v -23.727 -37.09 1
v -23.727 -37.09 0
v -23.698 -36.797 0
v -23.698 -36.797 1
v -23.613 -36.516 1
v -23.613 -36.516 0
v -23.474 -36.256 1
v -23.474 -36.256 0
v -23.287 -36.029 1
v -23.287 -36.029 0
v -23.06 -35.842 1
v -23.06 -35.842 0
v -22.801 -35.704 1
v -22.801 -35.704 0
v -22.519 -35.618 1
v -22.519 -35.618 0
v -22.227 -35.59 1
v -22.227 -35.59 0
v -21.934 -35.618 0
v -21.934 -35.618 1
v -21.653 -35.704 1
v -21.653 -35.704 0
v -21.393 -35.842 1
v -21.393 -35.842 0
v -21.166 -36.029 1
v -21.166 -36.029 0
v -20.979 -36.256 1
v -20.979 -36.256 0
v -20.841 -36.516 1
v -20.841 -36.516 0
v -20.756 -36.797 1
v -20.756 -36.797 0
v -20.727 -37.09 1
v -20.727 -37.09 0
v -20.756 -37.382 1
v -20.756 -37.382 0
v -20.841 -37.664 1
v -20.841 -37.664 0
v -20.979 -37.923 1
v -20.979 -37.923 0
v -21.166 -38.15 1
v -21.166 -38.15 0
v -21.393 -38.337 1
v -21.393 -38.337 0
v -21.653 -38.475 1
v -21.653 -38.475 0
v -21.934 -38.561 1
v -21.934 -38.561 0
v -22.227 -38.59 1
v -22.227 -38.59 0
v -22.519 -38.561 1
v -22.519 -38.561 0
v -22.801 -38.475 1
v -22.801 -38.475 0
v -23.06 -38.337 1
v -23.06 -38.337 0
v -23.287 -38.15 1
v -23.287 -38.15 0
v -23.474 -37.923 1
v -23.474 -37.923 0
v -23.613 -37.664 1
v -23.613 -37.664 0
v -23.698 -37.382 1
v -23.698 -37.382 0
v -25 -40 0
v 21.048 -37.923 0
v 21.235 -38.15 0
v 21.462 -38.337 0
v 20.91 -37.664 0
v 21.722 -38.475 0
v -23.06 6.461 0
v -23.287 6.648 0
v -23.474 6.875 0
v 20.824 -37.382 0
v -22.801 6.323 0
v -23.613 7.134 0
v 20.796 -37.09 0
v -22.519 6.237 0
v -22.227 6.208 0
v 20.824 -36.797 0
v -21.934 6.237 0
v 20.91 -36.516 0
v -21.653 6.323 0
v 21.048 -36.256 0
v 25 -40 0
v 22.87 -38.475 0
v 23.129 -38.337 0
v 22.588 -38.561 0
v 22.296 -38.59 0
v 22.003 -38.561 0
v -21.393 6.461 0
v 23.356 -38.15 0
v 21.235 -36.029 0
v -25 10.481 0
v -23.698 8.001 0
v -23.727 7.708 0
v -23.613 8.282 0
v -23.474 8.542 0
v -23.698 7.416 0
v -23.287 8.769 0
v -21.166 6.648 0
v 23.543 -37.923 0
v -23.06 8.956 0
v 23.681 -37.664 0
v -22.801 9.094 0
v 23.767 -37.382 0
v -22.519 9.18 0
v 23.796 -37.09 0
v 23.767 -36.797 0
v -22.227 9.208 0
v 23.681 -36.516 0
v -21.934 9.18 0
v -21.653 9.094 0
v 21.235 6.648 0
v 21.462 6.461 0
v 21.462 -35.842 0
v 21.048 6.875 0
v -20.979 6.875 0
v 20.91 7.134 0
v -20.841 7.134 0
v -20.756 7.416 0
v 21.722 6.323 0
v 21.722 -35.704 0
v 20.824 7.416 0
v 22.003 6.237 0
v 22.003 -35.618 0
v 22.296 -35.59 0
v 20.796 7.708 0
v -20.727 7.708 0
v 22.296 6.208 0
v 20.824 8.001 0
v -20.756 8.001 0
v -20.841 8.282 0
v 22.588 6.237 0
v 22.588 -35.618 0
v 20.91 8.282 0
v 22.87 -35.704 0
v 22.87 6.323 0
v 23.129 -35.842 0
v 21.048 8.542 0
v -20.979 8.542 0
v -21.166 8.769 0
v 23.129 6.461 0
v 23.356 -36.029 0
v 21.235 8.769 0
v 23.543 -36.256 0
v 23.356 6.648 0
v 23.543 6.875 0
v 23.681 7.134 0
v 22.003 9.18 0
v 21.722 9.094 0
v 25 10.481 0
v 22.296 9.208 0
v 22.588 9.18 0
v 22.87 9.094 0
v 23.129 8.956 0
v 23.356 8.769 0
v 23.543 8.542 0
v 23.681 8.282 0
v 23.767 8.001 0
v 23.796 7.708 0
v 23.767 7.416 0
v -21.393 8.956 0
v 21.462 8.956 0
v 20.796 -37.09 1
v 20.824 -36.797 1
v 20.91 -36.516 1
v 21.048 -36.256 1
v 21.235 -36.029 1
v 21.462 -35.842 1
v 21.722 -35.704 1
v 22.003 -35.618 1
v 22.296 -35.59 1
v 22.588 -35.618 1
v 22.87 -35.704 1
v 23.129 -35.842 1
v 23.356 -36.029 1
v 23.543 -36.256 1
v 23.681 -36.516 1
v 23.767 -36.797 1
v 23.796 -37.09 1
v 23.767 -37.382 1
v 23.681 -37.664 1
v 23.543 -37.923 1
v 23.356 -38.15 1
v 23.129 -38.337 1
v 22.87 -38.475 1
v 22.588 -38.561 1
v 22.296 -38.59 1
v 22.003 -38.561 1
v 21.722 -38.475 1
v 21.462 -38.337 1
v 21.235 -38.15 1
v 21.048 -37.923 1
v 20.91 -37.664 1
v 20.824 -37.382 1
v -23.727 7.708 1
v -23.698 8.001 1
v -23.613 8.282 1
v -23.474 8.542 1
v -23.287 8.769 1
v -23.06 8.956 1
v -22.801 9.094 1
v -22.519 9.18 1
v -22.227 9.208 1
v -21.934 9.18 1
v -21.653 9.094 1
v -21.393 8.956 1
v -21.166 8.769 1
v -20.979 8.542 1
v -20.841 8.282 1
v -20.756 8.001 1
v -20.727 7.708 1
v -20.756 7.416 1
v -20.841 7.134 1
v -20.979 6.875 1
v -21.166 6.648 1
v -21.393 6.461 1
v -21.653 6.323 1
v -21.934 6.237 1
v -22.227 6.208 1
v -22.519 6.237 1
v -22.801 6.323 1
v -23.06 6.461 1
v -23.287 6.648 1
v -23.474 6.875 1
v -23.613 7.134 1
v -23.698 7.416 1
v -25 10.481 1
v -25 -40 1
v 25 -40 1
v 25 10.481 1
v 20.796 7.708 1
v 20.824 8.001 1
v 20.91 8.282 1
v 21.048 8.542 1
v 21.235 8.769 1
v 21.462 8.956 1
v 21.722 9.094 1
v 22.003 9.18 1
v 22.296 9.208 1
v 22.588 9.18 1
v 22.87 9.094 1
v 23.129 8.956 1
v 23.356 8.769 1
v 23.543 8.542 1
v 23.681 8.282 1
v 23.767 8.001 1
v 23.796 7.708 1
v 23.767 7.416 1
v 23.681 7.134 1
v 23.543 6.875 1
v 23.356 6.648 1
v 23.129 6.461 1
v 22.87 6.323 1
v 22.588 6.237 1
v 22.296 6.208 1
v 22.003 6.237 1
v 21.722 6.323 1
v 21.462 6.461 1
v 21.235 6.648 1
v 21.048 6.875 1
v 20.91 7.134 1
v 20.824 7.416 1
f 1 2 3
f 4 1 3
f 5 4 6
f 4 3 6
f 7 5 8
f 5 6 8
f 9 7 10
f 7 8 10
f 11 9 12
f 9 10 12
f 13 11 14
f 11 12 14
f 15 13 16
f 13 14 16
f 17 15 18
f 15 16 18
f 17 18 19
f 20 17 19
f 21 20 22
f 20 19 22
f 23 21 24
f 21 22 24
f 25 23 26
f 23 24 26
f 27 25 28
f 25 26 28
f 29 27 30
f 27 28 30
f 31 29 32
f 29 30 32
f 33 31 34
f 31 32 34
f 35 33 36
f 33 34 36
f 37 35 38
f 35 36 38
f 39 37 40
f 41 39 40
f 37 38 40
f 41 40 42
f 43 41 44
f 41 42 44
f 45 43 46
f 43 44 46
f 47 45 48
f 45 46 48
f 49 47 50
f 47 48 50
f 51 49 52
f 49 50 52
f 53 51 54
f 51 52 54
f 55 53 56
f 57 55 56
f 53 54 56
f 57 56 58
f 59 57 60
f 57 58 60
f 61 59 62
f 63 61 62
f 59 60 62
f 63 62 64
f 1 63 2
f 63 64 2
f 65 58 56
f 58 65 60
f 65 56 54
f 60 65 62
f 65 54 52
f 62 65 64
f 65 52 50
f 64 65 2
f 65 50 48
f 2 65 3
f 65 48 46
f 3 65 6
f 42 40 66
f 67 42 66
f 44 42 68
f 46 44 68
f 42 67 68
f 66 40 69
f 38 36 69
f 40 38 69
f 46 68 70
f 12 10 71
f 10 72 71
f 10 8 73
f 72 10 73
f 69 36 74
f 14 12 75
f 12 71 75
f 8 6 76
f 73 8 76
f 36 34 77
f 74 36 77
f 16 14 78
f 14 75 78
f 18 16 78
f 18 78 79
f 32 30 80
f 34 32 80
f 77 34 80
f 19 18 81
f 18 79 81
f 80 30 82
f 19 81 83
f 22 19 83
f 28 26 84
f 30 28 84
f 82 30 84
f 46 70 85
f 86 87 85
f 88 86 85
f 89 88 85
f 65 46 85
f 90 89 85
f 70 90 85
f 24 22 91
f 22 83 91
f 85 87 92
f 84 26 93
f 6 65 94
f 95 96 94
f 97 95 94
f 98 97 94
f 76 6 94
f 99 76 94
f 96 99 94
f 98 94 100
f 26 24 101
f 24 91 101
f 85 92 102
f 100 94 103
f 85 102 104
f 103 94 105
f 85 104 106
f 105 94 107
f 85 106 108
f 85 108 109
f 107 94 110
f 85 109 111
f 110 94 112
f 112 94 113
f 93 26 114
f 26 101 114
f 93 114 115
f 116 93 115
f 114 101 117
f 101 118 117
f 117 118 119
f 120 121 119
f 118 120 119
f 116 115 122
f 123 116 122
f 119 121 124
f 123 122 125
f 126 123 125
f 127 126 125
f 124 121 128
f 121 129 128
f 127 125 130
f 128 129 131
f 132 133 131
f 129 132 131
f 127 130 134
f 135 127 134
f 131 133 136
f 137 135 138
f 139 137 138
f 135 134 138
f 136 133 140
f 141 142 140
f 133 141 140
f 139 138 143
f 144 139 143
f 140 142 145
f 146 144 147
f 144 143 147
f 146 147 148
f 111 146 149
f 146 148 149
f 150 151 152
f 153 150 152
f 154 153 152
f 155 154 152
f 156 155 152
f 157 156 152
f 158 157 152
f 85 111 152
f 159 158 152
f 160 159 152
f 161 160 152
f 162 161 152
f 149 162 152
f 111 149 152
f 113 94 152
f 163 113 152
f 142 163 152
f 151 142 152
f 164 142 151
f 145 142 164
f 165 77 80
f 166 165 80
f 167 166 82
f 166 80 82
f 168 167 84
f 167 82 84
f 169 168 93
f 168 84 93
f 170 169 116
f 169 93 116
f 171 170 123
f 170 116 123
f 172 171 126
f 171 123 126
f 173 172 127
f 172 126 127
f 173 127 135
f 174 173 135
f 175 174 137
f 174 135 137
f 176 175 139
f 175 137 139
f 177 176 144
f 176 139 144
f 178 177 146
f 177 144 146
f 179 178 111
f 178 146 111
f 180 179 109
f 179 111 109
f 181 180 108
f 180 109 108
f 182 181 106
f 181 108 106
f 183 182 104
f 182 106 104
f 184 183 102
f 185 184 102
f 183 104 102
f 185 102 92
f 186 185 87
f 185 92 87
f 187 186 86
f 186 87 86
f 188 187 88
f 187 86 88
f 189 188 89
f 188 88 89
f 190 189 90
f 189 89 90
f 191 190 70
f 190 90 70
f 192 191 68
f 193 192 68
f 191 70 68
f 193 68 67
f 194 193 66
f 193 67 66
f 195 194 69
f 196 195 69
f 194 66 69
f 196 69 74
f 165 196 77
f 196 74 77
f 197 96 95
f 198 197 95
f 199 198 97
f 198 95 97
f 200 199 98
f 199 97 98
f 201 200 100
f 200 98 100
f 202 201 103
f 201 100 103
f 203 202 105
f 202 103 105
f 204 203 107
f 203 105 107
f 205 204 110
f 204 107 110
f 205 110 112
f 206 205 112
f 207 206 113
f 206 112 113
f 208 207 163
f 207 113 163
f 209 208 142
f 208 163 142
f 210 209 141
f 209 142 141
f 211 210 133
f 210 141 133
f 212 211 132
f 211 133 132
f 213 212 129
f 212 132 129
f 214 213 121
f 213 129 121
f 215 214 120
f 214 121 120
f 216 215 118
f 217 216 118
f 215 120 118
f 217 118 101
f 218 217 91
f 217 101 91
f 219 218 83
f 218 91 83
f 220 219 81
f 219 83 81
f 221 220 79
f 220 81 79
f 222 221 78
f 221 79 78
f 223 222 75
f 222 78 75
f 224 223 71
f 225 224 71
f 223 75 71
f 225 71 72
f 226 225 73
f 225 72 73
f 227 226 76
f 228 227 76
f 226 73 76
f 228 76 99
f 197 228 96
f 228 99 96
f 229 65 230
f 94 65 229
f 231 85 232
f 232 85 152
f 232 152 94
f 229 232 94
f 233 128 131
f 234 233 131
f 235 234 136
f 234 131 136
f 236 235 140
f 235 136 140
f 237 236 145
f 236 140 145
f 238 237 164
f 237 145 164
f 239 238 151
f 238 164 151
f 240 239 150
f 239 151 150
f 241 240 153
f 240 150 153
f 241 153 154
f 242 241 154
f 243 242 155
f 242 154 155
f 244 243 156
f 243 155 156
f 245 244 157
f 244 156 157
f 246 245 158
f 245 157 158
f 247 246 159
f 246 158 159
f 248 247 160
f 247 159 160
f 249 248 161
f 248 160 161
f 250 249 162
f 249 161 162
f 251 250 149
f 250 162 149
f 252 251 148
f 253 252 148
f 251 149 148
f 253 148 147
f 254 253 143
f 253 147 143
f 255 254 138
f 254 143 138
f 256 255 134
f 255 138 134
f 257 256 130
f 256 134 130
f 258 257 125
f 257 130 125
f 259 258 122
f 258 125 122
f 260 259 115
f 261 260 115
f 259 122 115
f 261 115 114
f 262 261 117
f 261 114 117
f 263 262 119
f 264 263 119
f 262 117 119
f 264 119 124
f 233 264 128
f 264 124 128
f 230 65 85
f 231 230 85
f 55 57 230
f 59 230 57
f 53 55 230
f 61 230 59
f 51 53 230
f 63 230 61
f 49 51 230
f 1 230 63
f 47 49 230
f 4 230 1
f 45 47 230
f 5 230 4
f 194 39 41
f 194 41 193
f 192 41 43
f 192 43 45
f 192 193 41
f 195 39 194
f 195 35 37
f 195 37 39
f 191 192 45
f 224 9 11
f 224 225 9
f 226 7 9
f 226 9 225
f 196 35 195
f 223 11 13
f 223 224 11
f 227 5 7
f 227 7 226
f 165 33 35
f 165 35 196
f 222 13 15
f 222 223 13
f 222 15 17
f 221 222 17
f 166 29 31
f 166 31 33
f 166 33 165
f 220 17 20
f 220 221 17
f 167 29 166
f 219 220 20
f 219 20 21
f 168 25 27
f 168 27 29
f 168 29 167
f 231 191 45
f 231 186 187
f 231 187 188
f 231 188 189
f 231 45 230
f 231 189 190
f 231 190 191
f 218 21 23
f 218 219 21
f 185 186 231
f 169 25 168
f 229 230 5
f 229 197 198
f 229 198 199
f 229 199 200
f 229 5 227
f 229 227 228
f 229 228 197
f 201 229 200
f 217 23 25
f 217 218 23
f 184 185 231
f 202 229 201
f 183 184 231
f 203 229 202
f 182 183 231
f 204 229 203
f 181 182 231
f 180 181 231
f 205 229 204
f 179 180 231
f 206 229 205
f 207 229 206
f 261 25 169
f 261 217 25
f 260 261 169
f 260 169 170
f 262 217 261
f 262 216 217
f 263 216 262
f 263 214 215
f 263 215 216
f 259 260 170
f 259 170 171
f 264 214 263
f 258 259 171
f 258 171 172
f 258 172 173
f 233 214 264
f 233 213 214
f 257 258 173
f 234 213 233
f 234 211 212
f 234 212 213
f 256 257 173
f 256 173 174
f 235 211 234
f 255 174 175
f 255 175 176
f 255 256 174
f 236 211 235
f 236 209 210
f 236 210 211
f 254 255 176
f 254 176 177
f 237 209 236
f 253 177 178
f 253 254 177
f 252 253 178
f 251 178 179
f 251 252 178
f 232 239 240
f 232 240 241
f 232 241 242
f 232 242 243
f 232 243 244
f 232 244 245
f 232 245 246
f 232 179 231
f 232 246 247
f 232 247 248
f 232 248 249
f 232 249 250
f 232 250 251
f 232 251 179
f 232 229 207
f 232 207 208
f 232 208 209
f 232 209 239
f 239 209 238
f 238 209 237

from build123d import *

# Parameters (mm, degrees)
SKETCH2_W           = 50
SKETCH2_H           = 80
BOSS_EXTRUDE1_DEPTH = 1
SKETCH3_W           = 50
SKETCH3_H           = 29.519153455
CUT_EXTRUDE1_DEPTH  = 1
SKETCH4_R           = 1.5
CUT_EXTRUDE2_DEPTH  = 1


with BuildPart() as part:
    # Sketch2 → Boss-Extrude1 (new body)
    with BuildSketch(Plane.XY):
        Rectangle(SKETCH2_W, SKETCH2_H)
    extrude(amount=BOSS_EXTRUDE1_DEPTH)

    # Sketch3 → Cut-Extrude1 (cut)
    with BuildSketch(Plane(origin=(0, 0, 0), x_dir=(-1, 0, 0), z_dir=(0, 0, -1))):
        with Locations((0, 25.240423272)):
            Rectangle(SKETCH3_W, SKETCH3_H)
    extrude(amount=-CUT_EXTRUDE1_DEPTH, mode=Mode.SUBTRACT)

    # Sketch4 → Cut-Extrude2 (cut)
    with BuildSketch(Plane(origin=(0, 0, 0), x_dir=(-1, 0, 0), z_dir=(0, 0, -1))):
        with Locations((-22.295607623, 7.7083308)):
            Circle(SKETCH4_R)
        with Locations((-22.295607623, -37.089644331)):
            Circle(SKETCH4_R)
        with Locations((22.226687661, 7.7083308)):
            Circle(SKETCH4_R)
        with Locations((22.226687661, -37.089644331)):
            Circle(SKETCH4_R)
    extrude(amount=-CUT_EXTRUDE2_DEPTH, mode=Mode.SUBTRACT)


solid = part.part
